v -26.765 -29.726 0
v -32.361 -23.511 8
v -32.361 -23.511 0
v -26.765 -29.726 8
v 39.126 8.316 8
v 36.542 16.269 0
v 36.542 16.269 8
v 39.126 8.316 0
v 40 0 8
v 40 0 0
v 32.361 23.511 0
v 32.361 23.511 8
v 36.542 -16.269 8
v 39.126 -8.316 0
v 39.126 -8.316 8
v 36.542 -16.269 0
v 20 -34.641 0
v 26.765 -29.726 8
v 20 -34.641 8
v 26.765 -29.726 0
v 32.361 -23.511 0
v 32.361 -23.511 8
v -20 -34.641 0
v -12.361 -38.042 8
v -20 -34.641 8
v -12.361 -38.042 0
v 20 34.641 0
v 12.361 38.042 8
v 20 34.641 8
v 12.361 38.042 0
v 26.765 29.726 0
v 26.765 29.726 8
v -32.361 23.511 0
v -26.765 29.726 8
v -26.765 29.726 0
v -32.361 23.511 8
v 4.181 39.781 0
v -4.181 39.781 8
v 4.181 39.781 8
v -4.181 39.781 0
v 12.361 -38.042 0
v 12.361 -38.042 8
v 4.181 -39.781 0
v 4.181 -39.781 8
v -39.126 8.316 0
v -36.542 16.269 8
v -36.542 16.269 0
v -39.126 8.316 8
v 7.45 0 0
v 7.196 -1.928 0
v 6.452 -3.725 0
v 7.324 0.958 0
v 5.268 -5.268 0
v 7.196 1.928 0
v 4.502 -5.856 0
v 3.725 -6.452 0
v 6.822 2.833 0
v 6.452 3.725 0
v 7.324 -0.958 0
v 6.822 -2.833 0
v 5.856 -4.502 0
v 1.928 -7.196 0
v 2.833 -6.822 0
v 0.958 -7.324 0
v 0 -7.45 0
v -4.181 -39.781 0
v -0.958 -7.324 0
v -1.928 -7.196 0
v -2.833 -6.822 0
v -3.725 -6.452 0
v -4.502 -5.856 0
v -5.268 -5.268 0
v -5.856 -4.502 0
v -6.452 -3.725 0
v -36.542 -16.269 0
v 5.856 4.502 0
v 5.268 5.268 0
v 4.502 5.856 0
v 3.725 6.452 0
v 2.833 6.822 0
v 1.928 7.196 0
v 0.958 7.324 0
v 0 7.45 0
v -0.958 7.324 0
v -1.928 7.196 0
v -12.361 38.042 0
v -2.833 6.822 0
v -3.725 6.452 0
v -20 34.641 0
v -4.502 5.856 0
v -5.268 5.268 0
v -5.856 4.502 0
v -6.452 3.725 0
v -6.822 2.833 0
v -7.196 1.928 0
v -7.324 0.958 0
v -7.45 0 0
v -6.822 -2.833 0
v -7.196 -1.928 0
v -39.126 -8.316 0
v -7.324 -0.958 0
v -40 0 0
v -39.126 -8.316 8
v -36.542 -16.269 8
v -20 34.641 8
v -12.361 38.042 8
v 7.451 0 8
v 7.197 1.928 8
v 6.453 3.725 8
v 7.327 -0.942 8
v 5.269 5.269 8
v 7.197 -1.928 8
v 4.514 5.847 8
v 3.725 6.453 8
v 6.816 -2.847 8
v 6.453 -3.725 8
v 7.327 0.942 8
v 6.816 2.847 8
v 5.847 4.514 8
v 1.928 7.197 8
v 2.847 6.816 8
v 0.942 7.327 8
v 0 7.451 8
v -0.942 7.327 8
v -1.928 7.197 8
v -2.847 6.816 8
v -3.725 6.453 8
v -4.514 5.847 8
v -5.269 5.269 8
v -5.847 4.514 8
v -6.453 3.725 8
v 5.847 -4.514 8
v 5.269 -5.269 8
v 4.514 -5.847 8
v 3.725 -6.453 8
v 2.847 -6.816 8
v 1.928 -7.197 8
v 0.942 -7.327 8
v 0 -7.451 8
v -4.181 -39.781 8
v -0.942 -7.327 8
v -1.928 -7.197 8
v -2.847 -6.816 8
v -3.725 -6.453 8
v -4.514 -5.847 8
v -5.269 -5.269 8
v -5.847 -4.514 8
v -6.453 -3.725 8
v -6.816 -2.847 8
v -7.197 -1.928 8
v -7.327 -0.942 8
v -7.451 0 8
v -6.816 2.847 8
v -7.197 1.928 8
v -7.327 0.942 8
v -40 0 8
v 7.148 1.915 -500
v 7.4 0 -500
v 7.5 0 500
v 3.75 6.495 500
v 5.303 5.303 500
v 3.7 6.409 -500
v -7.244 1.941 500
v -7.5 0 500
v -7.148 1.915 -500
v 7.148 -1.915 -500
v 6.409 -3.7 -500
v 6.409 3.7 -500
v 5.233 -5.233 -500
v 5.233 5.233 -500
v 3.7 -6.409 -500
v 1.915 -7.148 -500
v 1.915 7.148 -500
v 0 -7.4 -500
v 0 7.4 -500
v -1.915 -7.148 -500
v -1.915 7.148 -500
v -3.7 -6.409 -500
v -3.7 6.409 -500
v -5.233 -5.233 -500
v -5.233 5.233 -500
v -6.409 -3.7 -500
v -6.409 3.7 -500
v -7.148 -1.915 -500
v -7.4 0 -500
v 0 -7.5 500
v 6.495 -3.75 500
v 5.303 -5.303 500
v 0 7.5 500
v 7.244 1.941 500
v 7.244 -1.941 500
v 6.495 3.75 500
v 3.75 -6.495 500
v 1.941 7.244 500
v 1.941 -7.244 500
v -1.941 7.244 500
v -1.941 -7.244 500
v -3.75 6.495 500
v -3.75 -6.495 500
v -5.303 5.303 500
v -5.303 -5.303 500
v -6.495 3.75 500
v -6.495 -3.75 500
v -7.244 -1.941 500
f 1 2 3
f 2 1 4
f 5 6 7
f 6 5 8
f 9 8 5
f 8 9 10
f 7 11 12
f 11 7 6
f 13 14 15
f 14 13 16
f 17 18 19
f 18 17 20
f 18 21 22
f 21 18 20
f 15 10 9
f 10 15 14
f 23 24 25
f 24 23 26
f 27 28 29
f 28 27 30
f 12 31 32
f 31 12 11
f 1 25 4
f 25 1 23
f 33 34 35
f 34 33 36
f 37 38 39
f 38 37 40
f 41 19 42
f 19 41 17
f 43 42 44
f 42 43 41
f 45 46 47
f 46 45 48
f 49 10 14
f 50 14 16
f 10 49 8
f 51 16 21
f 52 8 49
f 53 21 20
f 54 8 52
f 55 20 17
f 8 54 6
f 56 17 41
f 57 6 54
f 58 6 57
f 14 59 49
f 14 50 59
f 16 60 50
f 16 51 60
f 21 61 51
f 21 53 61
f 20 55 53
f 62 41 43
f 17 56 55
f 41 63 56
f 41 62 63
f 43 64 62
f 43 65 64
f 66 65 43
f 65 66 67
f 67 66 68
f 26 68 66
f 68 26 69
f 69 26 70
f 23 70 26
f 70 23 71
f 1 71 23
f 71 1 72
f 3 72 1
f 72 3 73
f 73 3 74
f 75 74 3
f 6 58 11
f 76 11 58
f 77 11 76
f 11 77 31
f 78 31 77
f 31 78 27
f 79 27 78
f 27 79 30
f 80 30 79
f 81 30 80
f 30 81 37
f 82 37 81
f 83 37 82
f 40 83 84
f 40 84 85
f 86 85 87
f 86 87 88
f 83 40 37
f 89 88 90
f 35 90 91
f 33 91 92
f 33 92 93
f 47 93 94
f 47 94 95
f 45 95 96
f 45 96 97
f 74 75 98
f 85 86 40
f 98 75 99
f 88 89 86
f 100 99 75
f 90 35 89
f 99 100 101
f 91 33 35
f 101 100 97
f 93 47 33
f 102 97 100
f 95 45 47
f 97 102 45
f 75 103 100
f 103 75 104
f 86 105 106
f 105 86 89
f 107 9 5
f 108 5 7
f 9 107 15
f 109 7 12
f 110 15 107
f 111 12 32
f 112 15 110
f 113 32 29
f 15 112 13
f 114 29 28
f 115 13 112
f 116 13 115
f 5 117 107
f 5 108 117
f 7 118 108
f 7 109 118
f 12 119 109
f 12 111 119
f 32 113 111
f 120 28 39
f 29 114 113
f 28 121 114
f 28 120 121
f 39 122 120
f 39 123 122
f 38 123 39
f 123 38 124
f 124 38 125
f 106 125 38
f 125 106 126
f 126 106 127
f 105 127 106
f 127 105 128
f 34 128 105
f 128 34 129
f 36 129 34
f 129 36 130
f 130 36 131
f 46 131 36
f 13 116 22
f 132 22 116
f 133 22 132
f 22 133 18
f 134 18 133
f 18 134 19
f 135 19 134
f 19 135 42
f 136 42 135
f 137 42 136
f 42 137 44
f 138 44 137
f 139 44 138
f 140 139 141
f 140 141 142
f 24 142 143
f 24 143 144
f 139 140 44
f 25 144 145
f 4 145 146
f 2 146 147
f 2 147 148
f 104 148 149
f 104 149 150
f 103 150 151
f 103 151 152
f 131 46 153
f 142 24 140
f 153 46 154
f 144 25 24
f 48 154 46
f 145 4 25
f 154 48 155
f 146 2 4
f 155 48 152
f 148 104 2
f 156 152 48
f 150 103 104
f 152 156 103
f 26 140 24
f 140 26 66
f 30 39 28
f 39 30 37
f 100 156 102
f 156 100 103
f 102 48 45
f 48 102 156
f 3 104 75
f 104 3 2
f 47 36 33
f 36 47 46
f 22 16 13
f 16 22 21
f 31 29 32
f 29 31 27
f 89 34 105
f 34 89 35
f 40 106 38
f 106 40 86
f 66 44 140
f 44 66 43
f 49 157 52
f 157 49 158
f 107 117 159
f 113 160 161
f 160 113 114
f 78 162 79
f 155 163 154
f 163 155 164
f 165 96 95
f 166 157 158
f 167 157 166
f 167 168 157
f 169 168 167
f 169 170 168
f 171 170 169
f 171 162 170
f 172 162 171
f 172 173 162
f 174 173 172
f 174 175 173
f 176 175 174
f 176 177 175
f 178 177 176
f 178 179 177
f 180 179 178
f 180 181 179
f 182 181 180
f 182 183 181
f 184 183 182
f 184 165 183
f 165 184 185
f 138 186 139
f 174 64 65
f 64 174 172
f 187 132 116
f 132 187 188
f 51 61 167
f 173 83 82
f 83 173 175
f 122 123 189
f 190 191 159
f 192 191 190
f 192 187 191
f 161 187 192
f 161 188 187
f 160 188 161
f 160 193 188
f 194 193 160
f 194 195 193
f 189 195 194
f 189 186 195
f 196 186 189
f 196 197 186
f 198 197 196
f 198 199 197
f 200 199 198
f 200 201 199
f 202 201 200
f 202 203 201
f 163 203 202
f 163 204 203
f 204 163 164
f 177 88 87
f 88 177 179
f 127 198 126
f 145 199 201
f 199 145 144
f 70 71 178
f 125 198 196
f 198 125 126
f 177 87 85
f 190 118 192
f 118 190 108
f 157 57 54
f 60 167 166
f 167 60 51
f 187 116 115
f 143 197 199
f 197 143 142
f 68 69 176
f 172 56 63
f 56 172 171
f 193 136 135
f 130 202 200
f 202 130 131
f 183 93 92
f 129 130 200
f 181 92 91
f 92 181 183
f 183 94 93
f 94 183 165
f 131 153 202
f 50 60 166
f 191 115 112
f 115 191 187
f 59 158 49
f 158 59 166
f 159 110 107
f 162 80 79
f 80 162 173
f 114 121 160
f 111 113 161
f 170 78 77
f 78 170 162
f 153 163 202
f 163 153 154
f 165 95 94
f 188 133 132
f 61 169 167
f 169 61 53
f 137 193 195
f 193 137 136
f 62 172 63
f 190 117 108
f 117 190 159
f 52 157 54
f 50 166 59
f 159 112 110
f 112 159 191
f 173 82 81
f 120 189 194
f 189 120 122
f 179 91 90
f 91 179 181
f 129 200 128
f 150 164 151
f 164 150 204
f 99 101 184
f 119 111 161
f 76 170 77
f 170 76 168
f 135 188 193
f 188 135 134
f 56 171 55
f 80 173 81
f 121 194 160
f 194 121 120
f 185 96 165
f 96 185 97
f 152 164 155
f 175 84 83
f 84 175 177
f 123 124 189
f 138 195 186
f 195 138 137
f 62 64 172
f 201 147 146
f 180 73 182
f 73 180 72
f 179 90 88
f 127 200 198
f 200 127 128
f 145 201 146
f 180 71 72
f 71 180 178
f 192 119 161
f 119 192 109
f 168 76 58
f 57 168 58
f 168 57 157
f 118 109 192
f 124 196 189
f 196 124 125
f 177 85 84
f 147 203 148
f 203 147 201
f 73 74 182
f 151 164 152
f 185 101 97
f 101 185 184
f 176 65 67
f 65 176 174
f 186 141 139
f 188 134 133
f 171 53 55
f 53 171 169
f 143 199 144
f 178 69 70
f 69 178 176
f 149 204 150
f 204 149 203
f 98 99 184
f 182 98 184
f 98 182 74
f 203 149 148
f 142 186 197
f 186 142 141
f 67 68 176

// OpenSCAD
module axle() {
	translate([0,0,-500])
	cylinder(1000, 7.4, 7.5);
	}
	
module pulley() {
	
	cylinder(8, 40, 40);
}

pulley();
axle();
